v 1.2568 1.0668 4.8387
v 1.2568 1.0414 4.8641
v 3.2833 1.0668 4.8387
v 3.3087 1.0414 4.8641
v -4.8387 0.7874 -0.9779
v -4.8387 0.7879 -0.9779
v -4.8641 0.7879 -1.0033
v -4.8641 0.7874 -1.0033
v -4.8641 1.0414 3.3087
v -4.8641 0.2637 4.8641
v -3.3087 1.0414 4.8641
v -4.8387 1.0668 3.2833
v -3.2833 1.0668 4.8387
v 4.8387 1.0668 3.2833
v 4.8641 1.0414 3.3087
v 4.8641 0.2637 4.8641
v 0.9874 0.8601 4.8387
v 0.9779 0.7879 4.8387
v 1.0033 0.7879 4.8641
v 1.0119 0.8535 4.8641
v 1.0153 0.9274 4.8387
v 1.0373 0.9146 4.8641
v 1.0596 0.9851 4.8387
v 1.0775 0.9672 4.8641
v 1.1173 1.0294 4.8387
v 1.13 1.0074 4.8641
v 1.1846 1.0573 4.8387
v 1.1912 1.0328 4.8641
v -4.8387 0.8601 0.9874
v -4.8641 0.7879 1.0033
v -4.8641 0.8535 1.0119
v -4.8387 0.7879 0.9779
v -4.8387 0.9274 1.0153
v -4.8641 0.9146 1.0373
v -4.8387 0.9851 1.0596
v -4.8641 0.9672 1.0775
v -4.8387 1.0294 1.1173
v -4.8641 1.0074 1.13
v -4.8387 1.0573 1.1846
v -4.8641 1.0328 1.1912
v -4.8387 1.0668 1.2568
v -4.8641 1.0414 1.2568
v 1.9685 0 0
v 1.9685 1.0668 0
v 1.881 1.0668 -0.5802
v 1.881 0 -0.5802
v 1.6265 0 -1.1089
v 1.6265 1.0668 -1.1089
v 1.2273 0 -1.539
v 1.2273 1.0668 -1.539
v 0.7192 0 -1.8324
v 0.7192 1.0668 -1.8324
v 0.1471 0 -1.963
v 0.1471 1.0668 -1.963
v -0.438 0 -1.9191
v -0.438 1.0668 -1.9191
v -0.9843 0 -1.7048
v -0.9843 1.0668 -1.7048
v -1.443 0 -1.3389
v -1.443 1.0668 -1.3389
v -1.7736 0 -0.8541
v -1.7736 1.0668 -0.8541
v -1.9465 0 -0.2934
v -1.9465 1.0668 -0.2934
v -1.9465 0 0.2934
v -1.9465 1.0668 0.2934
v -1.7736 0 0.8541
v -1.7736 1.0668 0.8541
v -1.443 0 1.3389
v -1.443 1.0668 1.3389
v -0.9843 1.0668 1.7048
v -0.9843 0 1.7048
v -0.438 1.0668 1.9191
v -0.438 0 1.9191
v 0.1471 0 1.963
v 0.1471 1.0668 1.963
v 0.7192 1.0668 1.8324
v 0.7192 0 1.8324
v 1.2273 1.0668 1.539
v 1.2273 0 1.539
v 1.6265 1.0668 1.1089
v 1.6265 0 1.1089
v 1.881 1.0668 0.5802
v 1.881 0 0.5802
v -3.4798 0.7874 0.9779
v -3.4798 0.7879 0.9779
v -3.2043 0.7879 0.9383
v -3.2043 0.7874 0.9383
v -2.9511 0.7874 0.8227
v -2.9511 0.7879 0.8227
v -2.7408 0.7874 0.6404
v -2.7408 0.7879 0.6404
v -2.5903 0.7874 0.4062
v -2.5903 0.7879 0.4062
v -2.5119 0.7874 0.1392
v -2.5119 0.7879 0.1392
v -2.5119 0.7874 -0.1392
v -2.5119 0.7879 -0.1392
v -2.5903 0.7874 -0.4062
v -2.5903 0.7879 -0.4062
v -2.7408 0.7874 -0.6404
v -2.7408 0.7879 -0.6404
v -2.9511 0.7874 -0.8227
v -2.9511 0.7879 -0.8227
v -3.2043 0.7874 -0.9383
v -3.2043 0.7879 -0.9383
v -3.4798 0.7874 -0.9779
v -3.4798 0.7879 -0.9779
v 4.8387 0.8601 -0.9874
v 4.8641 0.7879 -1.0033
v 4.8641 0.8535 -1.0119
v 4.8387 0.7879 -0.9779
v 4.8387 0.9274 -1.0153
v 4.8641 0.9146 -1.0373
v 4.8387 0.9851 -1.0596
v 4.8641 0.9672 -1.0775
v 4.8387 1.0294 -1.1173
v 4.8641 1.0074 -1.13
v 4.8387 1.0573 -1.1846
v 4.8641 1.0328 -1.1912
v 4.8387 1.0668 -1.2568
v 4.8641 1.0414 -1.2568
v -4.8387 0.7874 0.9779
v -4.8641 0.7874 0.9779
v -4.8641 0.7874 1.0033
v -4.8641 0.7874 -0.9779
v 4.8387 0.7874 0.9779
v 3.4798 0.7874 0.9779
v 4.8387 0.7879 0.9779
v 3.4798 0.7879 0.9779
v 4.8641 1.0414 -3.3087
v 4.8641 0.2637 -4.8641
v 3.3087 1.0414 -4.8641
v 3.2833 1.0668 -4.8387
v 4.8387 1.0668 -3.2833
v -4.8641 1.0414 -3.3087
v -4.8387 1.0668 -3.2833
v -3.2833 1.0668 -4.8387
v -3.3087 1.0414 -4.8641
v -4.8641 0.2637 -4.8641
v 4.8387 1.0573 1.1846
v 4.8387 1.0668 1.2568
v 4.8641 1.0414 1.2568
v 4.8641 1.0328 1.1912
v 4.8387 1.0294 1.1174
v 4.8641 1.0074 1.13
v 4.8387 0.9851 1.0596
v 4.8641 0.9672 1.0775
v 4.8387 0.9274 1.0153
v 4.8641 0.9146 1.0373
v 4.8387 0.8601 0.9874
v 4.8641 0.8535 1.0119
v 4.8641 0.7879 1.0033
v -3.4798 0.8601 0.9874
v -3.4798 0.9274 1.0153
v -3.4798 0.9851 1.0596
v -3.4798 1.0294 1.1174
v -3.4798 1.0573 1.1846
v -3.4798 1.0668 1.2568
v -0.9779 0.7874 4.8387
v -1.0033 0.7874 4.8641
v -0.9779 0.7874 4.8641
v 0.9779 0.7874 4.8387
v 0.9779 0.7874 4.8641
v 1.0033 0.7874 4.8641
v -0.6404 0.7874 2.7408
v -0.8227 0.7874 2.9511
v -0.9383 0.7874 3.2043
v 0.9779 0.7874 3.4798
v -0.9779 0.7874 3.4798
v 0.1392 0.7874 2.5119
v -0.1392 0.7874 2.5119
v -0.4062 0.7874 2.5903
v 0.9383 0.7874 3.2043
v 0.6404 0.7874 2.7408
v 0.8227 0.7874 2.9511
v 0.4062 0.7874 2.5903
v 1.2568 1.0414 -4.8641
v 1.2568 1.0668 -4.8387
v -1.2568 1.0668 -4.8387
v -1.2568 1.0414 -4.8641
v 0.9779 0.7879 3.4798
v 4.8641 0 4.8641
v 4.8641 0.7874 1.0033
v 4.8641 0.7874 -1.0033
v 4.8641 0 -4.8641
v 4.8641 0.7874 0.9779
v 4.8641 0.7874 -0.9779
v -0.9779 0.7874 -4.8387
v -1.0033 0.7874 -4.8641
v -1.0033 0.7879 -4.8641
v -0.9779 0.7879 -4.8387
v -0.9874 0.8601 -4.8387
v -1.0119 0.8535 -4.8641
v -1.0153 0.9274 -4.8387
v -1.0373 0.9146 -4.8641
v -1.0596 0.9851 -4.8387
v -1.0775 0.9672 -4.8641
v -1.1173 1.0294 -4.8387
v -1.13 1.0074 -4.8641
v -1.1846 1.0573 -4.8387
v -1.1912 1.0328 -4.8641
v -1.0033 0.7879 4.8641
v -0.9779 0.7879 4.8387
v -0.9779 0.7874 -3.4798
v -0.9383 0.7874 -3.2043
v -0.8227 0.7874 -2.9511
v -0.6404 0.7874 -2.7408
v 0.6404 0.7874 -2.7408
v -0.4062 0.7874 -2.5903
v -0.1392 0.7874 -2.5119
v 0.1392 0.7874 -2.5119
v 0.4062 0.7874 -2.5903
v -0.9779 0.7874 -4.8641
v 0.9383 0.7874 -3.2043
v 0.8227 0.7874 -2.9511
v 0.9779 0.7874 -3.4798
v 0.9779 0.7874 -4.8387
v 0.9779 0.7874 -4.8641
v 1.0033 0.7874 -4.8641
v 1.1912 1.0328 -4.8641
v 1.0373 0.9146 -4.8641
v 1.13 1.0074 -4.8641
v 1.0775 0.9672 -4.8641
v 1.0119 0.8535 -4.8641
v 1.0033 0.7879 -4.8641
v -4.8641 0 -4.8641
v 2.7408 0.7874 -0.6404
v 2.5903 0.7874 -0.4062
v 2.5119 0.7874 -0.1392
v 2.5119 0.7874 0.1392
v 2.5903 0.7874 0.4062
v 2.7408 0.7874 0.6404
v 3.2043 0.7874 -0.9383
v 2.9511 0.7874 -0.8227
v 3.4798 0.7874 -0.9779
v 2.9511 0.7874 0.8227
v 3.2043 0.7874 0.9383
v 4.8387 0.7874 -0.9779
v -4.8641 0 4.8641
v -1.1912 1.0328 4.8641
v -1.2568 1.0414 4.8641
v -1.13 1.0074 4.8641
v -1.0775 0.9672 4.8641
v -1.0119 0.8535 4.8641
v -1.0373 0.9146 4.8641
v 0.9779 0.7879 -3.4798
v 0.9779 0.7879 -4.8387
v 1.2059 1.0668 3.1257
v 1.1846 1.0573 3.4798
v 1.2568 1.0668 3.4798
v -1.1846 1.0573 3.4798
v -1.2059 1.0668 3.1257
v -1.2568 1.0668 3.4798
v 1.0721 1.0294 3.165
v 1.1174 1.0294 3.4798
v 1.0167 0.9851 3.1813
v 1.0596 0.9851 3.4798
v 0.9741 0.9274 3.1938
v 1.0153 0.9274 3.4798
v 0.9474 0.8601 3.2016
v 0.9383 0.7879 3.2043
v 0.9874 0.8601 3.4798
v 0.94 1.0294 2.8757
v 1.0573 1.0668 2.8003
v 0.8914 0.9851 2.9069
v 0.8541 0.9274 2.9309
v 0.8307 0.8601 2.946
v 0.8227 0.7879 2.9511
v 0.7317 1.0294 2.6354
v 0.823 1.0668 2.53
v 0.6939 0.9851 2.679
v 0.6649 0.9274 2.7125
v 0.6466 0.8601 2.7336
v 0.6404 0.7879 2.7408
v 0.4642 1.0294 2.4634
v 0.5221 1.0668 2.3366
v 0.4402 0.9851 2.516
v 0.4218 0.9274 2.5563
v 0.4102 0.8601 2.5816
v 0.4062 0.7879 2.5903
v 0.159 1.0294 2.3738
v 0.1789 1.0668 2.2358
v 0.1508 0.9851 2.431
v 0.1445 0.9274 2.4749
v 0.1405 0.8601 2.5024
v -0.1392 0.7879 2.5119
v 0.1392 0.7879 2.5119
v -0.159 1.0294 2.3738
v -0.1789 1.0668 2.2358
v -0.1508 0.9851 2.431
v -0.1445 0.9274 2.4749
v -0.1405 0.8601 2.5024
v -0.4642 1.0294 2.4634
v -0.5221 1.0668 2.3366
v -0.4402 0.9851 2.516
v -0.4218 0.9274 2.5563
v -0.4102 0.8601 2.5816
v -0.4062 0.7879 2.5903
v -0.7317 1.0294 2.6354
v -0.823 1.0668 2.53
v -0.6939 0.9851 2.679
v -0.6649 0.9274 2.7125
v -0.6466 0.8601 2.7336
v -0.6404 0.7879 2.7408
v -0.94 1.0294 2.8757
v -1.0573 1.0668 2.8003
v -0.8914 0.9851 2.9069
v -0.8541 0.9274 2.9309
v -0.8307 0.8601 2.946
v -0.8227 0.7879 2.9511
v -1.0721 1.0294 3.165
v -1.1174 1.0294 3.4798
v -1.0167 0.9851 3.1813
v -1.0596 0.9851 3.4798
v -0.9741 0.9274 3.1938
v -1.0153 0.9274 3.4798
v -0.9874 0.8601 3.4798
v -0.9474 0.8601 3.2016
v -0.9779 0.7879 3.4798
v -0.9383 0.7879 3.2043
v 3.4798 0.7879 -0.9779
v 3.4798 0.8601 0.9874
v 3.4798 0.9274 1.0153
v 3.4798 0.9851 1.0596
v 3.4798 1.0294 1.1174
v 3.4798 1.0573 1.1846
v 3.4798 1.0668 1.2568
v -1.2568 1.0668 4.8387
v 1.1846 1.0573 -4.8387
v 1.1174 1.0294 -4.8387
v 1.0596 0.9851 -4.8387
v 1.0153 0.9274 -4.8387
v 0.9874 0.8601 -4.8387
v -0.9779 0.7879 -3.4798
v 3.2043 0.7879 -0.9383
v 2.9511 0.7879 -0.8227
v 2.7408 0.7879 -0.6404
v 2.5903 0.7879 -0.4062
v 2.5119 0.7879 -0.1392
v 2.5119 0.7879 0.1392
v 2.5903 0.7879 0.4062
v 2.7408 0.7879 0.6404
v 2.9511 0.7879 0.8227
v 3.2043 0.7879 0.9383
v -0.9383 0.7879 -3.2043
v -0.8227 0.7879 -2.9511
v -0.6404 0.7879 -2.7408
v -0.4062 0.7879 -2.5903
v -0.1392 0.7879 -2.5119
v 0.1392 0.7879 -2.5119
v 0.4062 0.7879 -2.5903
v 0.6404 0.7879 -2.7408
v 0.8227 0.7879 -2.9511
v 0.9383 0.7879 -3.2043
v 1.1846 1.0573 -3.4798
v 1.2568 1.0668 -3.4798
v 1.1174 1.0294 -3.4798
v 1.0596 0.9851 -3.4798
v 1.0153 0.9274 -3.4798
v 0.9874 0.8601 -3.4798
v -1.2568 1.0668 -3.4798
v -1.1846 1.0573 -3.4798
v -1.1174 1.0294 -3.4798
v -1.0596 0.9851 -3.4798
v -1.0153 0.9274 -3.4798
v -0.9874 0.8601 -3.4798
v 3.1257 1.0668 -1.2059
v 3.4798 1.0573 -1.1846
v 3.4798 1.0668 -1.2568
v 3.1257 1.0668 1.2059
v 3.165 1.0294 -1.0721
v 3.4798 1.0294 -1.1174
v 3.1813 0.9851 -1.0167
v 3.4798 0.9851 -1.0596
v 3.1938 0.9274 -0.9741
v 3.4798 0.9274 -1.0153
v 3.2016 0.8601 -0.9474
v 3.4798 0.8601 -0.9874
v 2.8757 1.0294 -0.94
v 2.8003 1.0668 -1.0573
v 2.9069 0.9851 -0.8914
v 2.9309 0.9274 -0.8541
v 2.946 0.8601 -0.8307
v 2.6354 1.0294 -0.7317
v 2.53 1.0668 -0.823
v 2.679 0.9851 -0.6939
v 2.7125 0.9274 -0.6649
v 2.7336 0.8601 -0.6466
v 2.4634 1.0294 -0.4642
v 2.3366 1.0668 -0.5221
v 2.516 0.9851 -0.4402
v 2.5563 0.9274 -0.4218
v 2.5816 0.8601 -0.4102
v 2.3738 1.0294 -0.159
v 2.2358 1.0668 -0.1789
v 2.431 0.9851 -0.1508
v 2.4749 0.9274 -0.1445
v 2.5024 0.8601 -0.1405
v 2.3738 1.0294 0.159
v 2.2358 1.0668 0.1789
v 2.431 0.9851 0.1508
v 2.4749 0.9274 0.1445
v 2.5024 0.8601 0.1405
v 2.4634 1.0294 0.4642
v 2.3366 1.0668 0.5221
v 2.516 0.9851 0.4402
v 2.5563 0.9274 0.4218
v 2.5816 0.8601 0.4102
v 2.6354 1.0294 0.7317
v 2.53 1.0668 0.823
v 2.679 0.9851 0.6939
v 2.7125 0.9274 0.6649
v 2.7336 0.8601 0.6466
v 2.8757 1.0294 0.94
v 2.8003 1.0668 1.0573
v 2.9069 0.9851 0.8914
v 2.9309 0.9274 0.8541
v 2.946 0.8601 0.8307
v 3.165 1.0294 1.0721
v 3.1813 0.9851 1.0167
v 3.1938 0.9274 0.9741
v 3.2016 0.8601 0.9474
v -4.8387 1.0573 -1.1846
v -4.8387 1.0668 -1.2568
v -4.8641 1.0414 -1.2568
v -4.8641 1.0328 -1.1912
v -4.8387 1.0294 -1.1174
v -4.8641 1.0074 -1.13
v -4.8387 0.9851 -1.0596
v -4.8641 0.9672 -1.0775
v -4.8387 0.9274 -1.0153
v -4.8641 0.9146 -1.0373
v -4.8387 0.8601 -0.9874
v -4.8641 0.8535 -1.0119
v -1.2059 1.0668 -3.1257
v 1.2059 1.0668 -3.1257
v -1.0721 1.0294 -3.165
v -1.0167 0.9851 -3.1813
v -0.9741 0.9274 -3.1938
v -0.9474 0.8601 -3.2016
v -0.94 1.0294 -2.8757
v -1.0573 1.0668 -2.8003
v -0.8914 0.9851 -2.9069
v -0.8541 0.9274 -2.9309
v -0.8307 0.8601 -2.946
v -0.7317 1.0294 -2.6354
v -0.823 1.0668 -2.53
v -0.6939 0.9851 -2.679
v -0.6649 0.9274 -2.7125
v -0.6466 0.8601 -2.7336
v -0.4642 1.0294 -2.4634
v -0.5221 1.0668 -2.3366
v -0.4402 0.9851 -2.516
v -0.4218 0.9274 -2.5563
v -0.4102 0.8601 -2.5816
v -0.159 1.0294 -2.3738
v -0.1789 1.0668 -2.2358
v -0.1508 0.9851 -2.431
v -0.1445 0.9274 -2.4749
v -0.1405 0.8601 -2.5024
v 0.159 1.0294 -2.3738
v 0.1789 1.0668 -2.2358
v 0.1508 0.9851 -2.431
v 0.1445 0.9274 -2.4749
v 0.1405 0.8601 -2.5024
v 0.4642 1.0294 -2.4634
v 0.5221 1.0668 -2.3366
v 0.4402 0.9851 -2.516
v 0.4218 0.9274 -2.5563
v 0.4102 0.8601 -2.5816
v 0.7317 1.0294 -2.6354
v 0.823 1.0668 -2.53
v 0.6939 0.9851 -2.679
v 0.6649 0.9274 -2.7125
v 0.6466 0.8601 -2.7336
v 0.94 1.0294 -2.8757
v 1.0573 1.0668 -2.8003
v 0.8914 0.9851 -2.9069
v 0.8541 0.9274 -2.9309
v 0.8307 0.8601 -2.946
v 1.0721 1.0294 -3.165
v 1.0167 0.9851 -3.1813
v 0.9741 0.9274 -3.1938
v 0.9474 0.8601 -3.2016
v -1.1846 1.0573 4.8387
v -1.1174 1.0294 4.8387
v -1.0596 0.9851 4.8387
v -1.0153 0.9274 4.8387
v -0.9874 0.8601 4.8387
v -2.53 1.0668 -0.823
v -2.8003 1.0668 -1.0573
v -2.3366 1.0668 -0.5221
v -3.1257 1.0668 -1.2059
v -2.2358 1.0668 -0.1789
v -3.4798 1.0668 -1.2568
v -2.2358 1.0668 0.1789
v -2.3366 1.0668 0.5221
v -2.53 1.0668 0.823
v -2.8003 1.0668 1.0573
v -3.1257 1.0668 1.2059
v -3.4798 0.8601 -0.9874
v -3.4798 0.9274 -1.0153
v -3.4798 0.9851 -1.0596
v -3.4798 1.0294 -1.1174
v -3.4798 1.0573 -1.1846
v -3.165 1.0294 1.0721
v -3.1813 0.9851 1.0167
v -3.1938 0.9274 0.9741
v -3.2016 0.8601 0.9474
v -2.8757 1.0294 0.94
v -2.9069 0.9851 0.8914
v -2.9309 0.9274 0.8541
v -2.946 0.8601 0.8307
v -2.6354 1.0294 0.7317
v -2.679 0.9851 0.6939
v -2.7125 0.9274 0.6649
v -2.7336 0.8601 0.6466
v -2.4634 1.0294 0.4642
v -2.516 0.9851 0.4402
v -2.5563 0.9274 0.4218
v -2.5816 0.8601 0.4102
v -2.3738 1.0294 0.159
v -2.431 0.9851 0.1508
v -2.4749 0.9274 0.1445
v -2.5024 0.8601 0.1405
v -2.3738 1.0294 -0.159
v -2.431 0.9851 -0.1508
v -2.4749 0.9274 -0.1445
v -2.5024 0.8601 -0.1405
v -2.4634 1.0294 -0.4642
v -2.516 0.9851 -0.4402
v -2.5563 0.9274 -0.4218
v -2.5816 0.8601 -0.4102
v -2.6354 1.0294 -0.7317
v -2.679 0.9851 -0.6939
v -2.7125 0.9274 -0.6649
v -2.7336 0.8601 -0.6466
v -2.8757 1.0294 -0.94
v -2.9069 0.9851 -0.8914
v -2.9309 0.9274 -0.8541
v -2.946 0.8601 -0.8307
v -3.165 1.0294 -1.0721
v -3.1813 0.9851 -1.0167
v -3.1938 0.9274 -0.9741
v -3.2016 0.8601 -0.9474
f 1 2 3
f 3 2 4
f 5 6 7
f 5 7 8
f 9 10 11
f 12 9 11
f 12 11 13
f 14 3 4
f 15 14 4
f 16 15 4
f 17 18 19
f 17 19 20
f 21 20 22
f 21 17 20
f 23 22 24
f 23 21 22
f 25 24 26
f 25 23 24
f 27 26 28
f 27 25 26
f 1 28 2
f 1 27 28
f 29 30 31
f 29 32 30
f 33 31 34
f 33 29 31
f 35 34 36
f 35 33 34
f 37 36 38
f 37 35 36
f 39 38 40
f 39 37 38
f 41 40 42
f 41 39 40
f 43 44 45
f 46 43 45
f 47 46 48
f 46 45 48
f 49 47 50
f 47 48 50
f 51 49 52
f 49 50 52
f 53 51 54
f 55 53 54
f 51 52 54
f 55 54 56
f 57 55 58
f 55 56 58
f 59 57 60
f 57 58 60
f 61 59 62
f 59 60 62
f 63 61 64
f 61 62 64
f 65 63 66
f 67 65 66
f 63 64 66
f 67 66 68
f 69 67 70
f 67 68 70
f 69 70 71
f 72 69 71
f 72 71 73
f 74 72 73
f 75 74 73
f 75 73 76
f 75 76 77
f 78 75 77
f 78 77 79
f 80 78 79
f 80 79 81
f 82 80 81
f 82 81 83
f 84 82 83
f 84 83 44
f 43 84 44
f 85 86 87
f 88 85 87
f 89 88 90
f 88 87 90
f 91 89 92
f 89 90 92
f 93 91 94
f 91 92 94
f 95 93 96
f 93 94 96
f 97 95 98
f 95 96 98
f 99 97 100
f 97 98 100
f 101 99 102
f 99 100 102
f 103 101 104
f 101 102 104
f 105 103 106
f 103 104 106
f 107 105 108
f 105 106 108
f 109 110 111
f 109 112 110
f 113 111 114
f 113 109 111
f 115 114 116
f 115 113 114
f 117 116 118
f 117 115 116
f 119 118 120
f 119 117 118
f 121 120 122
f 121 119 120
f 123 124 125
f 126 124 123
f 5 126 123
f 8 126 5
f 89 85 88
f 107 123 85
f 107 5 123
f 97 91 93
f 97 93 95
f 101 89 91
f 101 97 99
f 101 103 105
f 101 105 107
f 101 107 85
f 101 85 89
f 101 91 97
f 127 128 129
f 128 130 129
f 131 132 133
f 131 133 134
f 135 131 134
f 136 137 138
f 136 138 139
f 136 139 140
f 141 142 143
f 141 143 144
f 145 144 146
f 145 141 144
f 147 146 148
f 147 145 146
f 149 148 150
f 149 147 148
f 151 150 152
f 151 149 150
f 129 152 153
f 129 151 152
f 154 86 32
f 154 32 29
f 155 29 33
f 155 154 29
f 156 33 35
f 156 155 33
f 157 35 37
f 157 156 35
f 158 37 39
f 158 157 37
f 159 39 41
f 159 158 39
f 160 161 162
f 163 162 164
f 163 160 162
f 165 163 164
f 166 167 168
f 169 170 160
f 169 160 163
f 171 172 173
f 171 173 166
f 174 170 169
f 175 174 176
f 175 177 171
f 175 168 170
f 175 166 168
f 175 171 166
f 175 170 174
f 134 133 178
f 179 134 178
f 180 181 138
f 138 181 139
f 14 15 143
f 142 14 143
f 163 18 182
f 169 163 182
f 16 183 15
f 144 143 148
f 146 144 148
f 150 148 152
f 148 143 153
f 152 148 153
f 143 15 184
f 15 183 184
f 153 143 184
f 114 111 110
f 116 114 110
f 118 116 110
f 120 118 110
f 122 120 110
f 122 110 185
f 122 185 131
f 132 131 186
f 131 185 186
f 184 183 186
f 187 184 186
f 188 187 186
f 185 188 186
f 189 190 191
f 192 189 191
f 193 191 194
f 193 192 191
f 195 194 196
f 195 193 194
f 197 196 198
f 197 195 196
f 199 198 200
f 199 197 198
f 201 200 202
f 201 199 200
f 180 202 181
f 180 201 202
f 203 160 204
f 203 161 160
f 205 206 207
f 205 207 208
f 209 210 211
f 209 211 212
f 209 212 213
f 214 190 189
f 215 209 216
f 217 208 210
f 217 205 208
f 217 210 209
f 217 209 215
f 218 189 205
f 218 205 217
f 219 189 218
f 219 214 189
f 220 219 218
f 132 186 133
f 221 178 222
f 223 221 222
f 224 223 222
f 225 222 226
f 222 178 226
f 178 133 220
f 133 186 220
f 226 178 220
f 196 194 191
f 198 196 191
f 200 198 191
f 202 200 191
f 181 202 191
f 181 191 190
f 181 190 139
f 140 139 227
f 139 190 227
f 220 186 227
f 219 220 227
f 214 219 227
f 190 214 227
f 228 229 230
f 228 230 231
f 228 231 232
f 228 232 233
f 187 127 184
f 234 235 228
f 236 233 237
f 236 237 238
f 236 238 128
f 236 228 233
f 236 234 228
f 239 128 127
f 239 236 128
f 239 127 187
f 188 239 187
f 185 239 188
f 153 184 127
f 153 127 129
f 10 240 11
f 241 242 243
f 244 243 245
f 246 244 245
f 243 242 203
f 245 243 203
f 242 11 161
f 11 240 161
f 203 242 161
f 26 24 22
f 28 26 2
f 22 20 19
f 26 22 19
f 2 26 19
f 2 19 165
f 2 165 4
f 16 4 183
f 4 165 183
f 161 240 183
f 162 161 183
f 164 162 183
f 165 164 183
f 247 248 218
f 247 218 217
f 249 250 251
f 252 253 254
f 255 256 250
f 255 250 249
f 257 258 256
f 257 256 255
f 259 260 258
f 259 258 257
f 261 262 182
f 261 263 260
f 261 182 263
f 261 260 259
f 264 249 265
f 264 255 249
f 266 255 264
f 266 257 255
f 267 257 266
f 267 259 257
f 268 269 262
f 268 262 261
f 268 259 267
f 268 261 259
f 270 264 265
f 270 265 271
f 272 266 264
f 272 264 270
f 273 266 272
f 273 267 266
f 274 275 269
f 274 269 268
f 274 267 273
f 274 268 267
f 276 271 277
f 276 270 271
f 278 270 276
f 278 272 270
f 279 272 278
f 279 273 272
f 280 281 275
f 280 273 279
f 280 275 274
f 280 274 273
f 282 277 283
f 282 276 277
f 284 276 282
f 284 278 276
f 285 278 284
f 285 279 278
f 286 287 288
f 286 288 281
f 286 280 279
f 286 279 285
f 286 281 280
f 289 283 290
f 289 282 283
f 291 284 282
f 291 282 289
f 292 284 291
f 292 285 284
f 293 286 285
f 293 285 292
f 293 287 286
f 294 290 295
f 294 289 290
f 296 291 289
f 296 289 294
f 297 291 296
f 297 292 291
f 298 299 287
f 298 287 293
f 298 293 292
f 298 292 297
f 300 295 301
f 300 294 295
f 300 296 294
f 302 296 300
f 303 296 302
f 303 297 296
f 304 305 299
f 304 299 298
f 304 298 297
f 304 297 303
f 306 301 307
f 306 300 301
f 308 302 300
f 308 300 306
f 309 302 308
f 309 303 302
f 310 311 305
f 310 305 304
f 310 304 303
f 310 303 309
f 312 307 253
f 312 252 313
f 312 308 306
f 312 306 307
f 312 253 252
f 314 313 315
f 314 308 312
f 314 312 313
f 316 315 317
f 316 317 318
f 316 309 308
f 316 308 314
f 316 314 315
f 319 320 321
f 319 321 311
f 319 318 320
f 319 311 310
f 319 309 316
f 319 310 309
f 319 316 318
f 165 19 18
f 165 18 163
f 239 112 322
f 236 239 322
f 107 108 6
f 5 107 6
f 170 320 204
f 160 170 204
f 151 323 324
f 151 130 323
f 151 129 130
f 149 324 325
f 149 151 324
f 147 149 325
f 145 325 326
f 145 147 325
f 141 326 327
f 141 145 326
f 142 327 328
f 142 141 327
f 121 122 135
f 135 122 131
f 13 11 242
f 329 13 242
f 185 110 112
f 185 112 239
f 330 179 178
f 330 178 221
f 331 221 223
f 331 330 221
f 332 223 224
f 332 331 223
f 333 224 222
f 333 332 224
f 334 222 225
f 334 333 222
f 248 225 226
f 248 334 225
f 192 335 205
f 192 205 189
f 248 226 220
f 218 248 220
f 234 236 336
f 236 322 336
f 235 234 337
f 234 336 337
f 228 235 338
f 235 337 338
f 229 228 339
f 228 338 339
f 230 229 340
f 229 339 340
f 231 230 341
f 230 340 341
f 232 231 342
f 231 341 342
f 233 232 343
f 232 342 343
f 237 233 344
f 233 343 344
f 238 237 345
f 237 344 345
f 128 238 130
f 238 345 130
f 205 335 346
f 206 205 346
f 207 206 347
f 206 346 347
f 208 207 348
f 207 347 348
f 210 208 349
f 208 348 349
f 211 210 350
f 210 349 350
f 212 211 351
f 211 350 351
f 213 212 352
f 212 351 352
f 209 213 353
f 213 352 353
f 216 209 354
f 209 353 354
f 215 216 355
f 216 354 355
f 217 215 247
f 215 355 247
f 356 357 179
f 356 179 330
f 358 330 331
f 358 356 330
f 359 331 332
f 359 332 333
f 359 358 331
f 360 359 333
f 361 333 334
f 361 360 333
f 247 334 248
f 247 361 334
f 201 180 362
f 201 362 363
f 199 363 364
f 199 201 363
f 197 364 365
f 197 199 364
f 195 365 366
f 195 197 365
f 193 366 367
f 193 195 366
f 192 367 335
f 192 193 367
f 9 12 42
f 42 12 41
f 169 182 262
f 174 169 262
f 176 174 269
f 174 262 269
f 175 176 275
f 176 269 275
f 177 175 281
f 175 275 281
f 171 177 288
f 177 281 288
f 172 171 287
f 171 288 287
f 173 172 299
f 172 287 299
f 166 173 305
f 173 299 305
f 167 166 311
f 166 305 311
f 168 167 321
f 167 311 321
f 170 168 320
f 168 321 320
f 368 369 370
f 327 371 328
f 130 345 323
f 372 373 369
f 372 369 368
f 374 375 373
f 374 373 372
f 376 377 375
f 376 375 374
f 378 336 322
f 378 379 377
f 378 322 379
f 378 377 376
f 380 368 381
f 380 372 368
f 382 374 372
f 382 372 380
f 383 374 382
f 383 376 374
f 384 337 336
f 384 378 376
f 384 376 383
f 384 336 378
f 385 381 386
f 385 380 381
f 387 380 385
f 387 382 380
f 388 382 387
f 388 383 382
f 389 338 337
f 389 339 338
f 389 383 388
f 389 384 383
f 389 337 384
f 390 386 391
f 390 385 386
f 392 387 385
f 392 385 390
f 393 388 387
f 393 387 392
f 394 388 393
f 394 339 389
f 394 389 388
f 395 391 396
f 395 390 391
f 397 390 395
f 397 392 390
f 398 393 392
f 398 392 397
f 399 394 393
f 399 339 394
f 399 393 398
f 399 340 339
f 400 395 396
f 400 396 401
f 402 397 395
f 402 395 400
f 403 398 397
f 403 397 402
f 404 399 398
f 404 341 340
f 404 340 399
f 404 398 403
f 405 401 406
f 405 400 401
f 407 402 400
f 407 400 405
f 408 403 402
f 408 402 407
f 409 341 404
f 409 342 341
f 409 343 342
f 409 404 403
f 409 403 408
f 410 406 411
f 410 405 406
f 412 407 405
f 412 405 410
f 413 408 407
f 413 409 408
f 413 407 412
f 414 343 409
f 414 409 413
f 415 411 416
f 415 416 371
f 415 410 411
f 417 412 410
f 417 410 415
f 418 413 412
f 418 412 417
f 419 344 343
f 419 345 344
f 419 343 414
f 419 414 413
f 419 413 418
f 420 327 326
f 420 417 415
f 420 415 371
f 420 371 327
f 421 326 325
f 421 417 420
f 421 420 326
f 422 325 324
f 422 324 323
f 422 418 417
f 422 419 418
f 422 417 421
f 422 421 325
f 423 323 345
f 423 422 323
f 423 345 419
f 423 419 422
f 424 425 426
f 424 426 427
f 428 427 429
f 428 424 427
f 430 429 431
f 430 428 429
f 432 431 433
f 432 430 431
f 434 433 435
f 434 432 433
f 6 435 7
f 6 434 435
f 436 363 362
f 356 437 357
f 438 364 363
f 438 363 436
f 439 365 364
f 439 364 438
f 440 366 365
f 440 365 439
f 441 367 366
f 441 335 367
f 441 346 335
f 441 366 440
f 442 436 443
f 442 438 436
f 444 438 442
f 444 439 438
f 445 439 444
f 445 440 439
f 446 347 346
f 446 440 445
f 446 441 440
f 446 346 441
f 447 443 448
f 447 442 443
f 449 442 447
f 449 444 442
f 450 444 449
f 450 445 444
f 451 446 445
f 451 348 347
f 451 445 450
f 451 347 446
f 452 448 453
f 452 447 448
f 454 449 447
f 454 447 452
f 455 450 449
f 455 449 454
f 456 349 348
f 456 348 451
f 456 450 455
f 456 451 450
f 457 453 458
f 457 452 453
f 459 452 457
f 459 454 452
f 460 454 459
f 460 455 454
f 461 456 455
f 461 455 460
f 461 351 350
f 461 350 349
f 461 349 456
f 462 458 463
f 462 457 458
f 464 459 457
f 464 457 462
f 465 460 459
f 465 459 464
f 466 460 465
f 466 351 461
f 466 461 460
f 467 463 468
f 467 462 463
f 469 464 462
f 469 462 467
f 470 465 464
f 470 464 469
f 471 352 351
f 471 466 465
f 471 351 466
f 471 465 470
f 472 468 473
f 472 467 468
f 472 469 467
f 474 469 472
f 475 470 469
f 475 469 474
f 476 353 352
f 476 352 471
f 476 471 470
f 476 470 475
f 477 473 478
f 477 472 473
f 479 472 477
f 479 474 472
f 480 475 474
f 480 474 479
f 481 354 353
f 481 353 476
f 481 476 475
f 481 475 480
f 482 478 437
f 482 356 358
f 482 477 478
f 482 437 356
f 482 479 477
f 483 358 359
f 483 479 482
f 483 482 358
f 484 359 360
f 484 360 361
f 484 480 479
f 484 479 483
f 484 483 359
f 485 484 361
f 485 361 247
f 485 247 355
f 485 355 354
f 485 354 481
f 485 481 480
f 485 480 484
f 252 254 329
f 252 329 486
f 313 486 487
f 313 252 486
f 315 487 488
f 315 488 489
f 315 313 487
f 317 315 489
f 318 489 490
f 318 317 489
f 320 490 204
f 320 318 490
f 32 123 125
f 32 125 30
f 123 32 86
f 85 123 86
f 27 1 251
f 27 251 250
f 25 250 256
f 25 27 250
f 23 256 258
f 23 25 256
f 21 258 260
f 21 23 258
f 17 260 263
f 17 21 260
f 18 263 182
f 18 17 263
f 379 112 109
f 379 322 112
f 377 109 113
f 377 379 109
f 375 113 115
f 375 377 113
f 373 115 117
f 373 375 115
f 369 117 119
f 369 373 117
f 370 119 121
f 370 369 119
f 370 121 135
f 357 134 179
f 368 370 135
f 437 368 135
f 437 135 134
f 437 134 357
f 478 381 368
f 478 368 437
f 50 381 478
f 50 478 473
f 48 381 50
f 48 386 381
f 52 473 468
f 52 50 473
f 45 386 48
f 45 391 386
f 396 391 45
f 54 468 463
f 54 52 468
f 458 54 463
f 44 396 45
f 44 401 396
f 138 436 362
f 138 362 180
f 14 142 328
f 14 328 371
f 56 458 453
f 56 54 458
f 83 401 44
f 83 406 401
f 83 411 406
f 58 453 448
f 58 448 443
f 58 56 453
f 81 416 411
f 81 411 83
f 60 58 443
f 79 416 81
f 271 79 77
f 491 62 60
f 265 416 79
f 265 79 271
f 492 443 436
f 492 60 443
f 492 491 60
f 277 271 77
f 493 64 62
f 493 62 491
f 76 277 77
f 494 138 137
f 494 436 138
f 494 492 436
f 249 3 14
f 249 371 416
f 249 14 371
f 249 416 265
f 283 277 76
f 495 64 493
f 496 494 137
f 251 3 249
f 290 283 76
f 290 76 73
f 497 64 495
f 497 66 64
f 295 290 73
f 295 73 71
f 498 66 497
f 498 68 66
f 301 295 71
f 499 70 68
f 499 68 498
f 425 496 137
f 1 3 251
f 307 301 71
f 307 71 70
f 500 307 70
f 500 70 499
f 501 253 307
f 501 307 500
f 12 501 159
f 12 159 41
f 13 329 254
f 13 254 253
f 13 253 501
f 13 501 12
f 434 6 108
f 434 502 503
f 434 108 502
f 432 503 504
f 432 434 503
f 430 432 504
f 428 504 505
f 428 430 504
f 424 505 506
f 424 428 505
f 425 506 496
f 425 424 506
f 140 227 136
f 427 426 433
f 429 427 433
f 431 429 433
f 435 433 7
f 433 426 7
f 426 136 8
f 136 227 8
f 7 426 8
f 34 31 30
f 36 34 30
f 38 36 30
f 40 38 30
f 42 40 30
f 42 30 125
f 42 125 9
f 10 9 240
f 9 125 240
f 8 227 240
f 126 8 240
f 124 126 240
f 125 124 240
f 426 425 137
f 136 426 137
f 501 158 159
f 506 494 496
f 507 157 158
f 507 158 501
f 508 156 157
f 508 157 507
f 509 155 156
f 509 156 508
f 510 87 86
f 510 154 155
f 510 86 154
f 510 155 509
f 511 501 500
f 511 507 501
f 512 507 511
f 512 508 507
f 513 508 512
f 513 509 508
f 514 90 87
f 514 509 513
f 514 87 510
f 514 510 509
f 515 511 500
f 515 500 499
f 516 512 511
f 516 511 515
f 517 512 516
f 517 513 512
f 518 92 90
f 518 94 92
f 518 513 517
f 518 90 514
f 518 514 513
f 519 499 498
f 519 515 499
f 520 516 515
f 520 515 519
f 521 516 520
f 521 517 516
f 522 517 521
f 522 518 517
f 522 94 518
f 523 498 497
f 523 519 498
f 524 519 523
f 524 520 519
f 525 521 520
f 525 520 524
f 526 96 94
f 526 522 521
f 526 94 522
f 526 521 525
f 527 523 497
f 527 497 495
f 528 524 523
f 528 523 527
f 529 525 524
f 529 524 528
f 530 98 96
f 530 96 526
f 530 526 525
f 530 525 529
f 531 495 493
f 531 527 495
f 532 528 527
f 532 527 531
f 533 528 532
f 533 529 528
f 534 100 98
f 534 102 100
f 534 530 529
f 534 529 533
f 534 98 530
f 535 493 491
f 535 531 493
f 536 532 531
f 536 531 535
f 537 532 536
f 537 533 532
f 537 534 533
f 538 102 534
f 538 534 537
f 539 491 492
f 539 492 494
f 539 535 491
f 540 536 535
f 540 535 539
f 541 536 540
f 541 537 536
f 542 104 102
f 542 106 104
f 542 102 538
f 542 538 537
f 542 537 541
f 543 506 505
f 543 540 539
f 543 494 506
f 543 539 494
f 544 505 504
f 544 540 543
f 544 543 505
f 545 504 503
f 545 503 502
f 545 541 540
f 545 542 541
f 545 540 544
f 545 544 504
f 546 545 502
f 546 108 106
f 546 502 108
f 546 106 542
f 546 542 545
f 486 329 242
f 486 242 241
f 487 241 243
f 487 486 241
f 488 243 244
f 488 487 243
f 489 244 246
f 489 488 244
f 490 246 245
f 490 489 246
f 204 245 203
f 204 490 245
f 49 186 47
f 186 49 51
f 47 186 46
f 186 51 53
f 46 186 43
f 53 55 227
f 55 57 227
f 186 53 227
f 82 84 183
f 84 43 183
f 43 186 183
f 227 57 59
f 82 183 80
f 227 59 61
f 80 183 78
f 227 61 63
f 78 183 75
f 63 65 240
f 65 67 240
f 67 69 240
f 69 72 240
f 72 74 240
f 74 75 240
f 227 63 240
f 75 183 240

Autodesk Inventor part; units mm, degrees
ref_plane "YZ Plane" through (0, 0, 0) normal (1, 0, 0) x (0, 1, 0)
ref_plane "XZ Plane" through (0, 0, 0) normal (0, 1, 0) x (-1, 0, 0)
ref_plane "XY Plane" through (0, 0, 0) normal (0, 0, 1) x (1, 0, 0)
sketch "Sketch1" plane through (0, 0, 0) normal (0, 1, 0) x (-1, 0, 0)
  line L0 (4.8641, 4.8641) -> (-4.8641, 4.8641)
  line L1 (-4.8641, 4.8641) -> (-4.8641, -4.8641)
  line L2 (-4.8641, -4.8641) -> (4.8641, -4.8641)
  line L3 (4.8641, -4.8641) -> (4.8641, 4.8641)
  point P0 (0, 0)
  point P1 (4.8641, 0)
  point P2 (0, -4.8641)
  dimension "d0" = 9.7282
  dimension "d1" = 9.7282
extrude "Extrusion1" add sketch "Sketch1" along normal blind 1.0668
sketch "Sketch2" plane through (0, 1.0668, 0) normal (0, 1, 0) x (1, 0, 0)
  line L0 (-4.8641, -4.8641) -> (4.8641, -4.8641) projected
  line L1 (3.4798, -0.9779) -> (4.8641, -0.9779)
  line L2 (4.8641, -0.9779) -> (4.8641, 0.9779)
  line L3 (4.8641, 0.9779) -> (3.4798, 0.9779)
  line L4 (2.5019, 0) -> (2.5019, 0)
  arc A0 (2.5019, 0) -> (3.4798, -0.9779) centre (3.4798, 0) ccw
  arc A1 (3.4798, 0.9779) -> (2.5019, 0) centre (3.4798, 0) ccw
  line L5 (4.8641, -4.8641) -> (4.8641, 4.8641) projected
  line L6 (0, 2.5019) -> (0, 2.5019)
  line L7 (-0.9779, 3.4798) -> (-0.9779, 4.8641)
  line L8 (-0.9779, 4.8641) -> (0.9779, 4.8641)
  line L9 (0.9779, 4.8641) -> (0.9779, 3.4798)
  arc A2 (0, 2.5019) -> (0.9779, 3.4798) centre (0, 3.4798) ccw
  arc A3 (-0.9779, 3.4798) -> (0, 2.5019) centre (0, 3.4798) ccw
  line L10 (4.8641, 4.8641) -> (-4.8641, 4.8641) projected
  line L11 (-4.8641, -0.9779) -> (-3.4798, -0.9779)
  line L12 (-2.5019, 0) -> (-2.5019, 0)
  line L13 (-3.4798, 0.9779) -> (-4.8641, 0.9779)
  line L14 (-4.8641, 0.9779) -> (-4.8641, -0.9779)
  line L15 (-4.8641, 4.8641) -> (-4.8641, -4.8641) projected
  arc A4 (-3.4798, -0.9779) -> (-2.5019, 0) centre (-3.4798, 0) ccw
  arc A5 (-2.5019, 0) -> (-3.4798, 0.9779) centre (-3.4798, 0) ccw
  line L16 (-0.9779, -4.8641) -> (0.9779, -4.8641)
  line L17 (0.9779, -4.8641) -> (0.9779, -3.4798)
  line L18 (0, -2.5019) -> (0, -2.5019)
  line L19 (-0.9779, -3.4798) -> (-0.9779, -4.8641)
  arc A6 (0, -2.5019) -> (-0.9779, -3.4798) centre (0, -3.4798) ccw
  arc A7 (0.9779, -3.4798) -> (0, -2.5019) centre (0, -3.4798) ccw
  point P0 (0, 0)
  point P1 (4.8641, 0)
  point P2 (4.8641, 0)
  point P3 (0, -4.8641)
  point P4 (0, -4.8641)
  point P5 (0, -4.8641)
  point P6 (-0.9779, 2.5019)
  point P7 (0, 4.8641)
  point P8 (0, 4.8641)
  point P9 (-2.5019, 0.9779)
  point P10 (-4.8641, 0)
  point P11 (-4.8641, 0)
  point P12 (0.9779, -2.5019)
  point P13 (0, -4.8641)
  point P14 (0, -4.8641)
  dimension "d10" = 0.9779
  dimension "d11" = 1.9558
  dimension "d12" = 2.3622
  dimension "d13" = 2.3622
  dimension "d14" = 0.9779
  dimension "d15" = 2.3622
  dimension "d16" = 0.9779
  dimension "d17" = 2.3622
  dimension "d18" = 0.9779
extrude "Extrusion2" cut sketch "Sketch2" against normal blind 0.2794 contours L19 A6 A7 L17 L0 | L14 L13 A5 A4 L11 | L1 A0 A1 L3 L2 | L8 L9 A2 A3 L7
fillet "Fillet1" radius 0.2794 12 edges at (0, 1.0668, 2.5019) (0.9779, 1.0668, 4.1719) (-0.9779, 1.0668, 4.1719) (-4.1719, 1.0668, 0.9779) (-4.1719, 1.0668, -0.9779) (-2.5019, 1.0668, 0) (-0.9779, 1.0668, -4.172) (0.9779, 1.0668, -4.172) (0, 1.0668, -2.5019) (4.172, 1.0668, -0.9779) (4.172, 1.0668, 0.9779) (2.5019, 1.0668, 0)
sketch "Sketch3" plane through (0, 1.0668, 0) normal (0, 1, 0) x (1, 0, 0)
  circle A0 centre (0, 0) radius 1.9685
  dimension "d22" = 3.937
extrude "Extrusion3" cut sketch "Sketch3" against normal through all
chamfer "Chamfer1" distance 0.0254 angle 45 16 edges at (3.0605, 1.0668, 4.8641) (1.0596, 0.9851, 4.8641) (4.8641, 1.0668, 3.0604) (4.8641, 0.9851, 1.0596) (4.8641, 1.0668, -3.0605) (4.8641, 0.9851, -1.0596) (3.0605, 1.0668, -4.8641) (1.0596, 0.9851, -4.8641) (-3.0605, 1.0668, -4.8641) (-1.0596, 0.9851, -4.8641) (-4.8641, 1.0668, -3.0605) (-4.8641, 0.9851, -1.0596) (-4.8641, 1.0668, 3.0605) (-4.8641, 0.9851, 1.0596) (-3.0605, 1.0668, 4.8641) (-1.0596, 0.9851, 4.8641)
chamfer "Chamfer2" distance 1.27 angle 45 4 edges at (4.8514, 1.0541, 4.8514) (4.8514, 1.0541, -4.8514) (-4.8514, 1.0541, -4.8514) (-4.8514, 1.0541, 4.8514)
properties part number "SSR-40 DA Small Plate" material "Nickel-Copper Alloy 400"
